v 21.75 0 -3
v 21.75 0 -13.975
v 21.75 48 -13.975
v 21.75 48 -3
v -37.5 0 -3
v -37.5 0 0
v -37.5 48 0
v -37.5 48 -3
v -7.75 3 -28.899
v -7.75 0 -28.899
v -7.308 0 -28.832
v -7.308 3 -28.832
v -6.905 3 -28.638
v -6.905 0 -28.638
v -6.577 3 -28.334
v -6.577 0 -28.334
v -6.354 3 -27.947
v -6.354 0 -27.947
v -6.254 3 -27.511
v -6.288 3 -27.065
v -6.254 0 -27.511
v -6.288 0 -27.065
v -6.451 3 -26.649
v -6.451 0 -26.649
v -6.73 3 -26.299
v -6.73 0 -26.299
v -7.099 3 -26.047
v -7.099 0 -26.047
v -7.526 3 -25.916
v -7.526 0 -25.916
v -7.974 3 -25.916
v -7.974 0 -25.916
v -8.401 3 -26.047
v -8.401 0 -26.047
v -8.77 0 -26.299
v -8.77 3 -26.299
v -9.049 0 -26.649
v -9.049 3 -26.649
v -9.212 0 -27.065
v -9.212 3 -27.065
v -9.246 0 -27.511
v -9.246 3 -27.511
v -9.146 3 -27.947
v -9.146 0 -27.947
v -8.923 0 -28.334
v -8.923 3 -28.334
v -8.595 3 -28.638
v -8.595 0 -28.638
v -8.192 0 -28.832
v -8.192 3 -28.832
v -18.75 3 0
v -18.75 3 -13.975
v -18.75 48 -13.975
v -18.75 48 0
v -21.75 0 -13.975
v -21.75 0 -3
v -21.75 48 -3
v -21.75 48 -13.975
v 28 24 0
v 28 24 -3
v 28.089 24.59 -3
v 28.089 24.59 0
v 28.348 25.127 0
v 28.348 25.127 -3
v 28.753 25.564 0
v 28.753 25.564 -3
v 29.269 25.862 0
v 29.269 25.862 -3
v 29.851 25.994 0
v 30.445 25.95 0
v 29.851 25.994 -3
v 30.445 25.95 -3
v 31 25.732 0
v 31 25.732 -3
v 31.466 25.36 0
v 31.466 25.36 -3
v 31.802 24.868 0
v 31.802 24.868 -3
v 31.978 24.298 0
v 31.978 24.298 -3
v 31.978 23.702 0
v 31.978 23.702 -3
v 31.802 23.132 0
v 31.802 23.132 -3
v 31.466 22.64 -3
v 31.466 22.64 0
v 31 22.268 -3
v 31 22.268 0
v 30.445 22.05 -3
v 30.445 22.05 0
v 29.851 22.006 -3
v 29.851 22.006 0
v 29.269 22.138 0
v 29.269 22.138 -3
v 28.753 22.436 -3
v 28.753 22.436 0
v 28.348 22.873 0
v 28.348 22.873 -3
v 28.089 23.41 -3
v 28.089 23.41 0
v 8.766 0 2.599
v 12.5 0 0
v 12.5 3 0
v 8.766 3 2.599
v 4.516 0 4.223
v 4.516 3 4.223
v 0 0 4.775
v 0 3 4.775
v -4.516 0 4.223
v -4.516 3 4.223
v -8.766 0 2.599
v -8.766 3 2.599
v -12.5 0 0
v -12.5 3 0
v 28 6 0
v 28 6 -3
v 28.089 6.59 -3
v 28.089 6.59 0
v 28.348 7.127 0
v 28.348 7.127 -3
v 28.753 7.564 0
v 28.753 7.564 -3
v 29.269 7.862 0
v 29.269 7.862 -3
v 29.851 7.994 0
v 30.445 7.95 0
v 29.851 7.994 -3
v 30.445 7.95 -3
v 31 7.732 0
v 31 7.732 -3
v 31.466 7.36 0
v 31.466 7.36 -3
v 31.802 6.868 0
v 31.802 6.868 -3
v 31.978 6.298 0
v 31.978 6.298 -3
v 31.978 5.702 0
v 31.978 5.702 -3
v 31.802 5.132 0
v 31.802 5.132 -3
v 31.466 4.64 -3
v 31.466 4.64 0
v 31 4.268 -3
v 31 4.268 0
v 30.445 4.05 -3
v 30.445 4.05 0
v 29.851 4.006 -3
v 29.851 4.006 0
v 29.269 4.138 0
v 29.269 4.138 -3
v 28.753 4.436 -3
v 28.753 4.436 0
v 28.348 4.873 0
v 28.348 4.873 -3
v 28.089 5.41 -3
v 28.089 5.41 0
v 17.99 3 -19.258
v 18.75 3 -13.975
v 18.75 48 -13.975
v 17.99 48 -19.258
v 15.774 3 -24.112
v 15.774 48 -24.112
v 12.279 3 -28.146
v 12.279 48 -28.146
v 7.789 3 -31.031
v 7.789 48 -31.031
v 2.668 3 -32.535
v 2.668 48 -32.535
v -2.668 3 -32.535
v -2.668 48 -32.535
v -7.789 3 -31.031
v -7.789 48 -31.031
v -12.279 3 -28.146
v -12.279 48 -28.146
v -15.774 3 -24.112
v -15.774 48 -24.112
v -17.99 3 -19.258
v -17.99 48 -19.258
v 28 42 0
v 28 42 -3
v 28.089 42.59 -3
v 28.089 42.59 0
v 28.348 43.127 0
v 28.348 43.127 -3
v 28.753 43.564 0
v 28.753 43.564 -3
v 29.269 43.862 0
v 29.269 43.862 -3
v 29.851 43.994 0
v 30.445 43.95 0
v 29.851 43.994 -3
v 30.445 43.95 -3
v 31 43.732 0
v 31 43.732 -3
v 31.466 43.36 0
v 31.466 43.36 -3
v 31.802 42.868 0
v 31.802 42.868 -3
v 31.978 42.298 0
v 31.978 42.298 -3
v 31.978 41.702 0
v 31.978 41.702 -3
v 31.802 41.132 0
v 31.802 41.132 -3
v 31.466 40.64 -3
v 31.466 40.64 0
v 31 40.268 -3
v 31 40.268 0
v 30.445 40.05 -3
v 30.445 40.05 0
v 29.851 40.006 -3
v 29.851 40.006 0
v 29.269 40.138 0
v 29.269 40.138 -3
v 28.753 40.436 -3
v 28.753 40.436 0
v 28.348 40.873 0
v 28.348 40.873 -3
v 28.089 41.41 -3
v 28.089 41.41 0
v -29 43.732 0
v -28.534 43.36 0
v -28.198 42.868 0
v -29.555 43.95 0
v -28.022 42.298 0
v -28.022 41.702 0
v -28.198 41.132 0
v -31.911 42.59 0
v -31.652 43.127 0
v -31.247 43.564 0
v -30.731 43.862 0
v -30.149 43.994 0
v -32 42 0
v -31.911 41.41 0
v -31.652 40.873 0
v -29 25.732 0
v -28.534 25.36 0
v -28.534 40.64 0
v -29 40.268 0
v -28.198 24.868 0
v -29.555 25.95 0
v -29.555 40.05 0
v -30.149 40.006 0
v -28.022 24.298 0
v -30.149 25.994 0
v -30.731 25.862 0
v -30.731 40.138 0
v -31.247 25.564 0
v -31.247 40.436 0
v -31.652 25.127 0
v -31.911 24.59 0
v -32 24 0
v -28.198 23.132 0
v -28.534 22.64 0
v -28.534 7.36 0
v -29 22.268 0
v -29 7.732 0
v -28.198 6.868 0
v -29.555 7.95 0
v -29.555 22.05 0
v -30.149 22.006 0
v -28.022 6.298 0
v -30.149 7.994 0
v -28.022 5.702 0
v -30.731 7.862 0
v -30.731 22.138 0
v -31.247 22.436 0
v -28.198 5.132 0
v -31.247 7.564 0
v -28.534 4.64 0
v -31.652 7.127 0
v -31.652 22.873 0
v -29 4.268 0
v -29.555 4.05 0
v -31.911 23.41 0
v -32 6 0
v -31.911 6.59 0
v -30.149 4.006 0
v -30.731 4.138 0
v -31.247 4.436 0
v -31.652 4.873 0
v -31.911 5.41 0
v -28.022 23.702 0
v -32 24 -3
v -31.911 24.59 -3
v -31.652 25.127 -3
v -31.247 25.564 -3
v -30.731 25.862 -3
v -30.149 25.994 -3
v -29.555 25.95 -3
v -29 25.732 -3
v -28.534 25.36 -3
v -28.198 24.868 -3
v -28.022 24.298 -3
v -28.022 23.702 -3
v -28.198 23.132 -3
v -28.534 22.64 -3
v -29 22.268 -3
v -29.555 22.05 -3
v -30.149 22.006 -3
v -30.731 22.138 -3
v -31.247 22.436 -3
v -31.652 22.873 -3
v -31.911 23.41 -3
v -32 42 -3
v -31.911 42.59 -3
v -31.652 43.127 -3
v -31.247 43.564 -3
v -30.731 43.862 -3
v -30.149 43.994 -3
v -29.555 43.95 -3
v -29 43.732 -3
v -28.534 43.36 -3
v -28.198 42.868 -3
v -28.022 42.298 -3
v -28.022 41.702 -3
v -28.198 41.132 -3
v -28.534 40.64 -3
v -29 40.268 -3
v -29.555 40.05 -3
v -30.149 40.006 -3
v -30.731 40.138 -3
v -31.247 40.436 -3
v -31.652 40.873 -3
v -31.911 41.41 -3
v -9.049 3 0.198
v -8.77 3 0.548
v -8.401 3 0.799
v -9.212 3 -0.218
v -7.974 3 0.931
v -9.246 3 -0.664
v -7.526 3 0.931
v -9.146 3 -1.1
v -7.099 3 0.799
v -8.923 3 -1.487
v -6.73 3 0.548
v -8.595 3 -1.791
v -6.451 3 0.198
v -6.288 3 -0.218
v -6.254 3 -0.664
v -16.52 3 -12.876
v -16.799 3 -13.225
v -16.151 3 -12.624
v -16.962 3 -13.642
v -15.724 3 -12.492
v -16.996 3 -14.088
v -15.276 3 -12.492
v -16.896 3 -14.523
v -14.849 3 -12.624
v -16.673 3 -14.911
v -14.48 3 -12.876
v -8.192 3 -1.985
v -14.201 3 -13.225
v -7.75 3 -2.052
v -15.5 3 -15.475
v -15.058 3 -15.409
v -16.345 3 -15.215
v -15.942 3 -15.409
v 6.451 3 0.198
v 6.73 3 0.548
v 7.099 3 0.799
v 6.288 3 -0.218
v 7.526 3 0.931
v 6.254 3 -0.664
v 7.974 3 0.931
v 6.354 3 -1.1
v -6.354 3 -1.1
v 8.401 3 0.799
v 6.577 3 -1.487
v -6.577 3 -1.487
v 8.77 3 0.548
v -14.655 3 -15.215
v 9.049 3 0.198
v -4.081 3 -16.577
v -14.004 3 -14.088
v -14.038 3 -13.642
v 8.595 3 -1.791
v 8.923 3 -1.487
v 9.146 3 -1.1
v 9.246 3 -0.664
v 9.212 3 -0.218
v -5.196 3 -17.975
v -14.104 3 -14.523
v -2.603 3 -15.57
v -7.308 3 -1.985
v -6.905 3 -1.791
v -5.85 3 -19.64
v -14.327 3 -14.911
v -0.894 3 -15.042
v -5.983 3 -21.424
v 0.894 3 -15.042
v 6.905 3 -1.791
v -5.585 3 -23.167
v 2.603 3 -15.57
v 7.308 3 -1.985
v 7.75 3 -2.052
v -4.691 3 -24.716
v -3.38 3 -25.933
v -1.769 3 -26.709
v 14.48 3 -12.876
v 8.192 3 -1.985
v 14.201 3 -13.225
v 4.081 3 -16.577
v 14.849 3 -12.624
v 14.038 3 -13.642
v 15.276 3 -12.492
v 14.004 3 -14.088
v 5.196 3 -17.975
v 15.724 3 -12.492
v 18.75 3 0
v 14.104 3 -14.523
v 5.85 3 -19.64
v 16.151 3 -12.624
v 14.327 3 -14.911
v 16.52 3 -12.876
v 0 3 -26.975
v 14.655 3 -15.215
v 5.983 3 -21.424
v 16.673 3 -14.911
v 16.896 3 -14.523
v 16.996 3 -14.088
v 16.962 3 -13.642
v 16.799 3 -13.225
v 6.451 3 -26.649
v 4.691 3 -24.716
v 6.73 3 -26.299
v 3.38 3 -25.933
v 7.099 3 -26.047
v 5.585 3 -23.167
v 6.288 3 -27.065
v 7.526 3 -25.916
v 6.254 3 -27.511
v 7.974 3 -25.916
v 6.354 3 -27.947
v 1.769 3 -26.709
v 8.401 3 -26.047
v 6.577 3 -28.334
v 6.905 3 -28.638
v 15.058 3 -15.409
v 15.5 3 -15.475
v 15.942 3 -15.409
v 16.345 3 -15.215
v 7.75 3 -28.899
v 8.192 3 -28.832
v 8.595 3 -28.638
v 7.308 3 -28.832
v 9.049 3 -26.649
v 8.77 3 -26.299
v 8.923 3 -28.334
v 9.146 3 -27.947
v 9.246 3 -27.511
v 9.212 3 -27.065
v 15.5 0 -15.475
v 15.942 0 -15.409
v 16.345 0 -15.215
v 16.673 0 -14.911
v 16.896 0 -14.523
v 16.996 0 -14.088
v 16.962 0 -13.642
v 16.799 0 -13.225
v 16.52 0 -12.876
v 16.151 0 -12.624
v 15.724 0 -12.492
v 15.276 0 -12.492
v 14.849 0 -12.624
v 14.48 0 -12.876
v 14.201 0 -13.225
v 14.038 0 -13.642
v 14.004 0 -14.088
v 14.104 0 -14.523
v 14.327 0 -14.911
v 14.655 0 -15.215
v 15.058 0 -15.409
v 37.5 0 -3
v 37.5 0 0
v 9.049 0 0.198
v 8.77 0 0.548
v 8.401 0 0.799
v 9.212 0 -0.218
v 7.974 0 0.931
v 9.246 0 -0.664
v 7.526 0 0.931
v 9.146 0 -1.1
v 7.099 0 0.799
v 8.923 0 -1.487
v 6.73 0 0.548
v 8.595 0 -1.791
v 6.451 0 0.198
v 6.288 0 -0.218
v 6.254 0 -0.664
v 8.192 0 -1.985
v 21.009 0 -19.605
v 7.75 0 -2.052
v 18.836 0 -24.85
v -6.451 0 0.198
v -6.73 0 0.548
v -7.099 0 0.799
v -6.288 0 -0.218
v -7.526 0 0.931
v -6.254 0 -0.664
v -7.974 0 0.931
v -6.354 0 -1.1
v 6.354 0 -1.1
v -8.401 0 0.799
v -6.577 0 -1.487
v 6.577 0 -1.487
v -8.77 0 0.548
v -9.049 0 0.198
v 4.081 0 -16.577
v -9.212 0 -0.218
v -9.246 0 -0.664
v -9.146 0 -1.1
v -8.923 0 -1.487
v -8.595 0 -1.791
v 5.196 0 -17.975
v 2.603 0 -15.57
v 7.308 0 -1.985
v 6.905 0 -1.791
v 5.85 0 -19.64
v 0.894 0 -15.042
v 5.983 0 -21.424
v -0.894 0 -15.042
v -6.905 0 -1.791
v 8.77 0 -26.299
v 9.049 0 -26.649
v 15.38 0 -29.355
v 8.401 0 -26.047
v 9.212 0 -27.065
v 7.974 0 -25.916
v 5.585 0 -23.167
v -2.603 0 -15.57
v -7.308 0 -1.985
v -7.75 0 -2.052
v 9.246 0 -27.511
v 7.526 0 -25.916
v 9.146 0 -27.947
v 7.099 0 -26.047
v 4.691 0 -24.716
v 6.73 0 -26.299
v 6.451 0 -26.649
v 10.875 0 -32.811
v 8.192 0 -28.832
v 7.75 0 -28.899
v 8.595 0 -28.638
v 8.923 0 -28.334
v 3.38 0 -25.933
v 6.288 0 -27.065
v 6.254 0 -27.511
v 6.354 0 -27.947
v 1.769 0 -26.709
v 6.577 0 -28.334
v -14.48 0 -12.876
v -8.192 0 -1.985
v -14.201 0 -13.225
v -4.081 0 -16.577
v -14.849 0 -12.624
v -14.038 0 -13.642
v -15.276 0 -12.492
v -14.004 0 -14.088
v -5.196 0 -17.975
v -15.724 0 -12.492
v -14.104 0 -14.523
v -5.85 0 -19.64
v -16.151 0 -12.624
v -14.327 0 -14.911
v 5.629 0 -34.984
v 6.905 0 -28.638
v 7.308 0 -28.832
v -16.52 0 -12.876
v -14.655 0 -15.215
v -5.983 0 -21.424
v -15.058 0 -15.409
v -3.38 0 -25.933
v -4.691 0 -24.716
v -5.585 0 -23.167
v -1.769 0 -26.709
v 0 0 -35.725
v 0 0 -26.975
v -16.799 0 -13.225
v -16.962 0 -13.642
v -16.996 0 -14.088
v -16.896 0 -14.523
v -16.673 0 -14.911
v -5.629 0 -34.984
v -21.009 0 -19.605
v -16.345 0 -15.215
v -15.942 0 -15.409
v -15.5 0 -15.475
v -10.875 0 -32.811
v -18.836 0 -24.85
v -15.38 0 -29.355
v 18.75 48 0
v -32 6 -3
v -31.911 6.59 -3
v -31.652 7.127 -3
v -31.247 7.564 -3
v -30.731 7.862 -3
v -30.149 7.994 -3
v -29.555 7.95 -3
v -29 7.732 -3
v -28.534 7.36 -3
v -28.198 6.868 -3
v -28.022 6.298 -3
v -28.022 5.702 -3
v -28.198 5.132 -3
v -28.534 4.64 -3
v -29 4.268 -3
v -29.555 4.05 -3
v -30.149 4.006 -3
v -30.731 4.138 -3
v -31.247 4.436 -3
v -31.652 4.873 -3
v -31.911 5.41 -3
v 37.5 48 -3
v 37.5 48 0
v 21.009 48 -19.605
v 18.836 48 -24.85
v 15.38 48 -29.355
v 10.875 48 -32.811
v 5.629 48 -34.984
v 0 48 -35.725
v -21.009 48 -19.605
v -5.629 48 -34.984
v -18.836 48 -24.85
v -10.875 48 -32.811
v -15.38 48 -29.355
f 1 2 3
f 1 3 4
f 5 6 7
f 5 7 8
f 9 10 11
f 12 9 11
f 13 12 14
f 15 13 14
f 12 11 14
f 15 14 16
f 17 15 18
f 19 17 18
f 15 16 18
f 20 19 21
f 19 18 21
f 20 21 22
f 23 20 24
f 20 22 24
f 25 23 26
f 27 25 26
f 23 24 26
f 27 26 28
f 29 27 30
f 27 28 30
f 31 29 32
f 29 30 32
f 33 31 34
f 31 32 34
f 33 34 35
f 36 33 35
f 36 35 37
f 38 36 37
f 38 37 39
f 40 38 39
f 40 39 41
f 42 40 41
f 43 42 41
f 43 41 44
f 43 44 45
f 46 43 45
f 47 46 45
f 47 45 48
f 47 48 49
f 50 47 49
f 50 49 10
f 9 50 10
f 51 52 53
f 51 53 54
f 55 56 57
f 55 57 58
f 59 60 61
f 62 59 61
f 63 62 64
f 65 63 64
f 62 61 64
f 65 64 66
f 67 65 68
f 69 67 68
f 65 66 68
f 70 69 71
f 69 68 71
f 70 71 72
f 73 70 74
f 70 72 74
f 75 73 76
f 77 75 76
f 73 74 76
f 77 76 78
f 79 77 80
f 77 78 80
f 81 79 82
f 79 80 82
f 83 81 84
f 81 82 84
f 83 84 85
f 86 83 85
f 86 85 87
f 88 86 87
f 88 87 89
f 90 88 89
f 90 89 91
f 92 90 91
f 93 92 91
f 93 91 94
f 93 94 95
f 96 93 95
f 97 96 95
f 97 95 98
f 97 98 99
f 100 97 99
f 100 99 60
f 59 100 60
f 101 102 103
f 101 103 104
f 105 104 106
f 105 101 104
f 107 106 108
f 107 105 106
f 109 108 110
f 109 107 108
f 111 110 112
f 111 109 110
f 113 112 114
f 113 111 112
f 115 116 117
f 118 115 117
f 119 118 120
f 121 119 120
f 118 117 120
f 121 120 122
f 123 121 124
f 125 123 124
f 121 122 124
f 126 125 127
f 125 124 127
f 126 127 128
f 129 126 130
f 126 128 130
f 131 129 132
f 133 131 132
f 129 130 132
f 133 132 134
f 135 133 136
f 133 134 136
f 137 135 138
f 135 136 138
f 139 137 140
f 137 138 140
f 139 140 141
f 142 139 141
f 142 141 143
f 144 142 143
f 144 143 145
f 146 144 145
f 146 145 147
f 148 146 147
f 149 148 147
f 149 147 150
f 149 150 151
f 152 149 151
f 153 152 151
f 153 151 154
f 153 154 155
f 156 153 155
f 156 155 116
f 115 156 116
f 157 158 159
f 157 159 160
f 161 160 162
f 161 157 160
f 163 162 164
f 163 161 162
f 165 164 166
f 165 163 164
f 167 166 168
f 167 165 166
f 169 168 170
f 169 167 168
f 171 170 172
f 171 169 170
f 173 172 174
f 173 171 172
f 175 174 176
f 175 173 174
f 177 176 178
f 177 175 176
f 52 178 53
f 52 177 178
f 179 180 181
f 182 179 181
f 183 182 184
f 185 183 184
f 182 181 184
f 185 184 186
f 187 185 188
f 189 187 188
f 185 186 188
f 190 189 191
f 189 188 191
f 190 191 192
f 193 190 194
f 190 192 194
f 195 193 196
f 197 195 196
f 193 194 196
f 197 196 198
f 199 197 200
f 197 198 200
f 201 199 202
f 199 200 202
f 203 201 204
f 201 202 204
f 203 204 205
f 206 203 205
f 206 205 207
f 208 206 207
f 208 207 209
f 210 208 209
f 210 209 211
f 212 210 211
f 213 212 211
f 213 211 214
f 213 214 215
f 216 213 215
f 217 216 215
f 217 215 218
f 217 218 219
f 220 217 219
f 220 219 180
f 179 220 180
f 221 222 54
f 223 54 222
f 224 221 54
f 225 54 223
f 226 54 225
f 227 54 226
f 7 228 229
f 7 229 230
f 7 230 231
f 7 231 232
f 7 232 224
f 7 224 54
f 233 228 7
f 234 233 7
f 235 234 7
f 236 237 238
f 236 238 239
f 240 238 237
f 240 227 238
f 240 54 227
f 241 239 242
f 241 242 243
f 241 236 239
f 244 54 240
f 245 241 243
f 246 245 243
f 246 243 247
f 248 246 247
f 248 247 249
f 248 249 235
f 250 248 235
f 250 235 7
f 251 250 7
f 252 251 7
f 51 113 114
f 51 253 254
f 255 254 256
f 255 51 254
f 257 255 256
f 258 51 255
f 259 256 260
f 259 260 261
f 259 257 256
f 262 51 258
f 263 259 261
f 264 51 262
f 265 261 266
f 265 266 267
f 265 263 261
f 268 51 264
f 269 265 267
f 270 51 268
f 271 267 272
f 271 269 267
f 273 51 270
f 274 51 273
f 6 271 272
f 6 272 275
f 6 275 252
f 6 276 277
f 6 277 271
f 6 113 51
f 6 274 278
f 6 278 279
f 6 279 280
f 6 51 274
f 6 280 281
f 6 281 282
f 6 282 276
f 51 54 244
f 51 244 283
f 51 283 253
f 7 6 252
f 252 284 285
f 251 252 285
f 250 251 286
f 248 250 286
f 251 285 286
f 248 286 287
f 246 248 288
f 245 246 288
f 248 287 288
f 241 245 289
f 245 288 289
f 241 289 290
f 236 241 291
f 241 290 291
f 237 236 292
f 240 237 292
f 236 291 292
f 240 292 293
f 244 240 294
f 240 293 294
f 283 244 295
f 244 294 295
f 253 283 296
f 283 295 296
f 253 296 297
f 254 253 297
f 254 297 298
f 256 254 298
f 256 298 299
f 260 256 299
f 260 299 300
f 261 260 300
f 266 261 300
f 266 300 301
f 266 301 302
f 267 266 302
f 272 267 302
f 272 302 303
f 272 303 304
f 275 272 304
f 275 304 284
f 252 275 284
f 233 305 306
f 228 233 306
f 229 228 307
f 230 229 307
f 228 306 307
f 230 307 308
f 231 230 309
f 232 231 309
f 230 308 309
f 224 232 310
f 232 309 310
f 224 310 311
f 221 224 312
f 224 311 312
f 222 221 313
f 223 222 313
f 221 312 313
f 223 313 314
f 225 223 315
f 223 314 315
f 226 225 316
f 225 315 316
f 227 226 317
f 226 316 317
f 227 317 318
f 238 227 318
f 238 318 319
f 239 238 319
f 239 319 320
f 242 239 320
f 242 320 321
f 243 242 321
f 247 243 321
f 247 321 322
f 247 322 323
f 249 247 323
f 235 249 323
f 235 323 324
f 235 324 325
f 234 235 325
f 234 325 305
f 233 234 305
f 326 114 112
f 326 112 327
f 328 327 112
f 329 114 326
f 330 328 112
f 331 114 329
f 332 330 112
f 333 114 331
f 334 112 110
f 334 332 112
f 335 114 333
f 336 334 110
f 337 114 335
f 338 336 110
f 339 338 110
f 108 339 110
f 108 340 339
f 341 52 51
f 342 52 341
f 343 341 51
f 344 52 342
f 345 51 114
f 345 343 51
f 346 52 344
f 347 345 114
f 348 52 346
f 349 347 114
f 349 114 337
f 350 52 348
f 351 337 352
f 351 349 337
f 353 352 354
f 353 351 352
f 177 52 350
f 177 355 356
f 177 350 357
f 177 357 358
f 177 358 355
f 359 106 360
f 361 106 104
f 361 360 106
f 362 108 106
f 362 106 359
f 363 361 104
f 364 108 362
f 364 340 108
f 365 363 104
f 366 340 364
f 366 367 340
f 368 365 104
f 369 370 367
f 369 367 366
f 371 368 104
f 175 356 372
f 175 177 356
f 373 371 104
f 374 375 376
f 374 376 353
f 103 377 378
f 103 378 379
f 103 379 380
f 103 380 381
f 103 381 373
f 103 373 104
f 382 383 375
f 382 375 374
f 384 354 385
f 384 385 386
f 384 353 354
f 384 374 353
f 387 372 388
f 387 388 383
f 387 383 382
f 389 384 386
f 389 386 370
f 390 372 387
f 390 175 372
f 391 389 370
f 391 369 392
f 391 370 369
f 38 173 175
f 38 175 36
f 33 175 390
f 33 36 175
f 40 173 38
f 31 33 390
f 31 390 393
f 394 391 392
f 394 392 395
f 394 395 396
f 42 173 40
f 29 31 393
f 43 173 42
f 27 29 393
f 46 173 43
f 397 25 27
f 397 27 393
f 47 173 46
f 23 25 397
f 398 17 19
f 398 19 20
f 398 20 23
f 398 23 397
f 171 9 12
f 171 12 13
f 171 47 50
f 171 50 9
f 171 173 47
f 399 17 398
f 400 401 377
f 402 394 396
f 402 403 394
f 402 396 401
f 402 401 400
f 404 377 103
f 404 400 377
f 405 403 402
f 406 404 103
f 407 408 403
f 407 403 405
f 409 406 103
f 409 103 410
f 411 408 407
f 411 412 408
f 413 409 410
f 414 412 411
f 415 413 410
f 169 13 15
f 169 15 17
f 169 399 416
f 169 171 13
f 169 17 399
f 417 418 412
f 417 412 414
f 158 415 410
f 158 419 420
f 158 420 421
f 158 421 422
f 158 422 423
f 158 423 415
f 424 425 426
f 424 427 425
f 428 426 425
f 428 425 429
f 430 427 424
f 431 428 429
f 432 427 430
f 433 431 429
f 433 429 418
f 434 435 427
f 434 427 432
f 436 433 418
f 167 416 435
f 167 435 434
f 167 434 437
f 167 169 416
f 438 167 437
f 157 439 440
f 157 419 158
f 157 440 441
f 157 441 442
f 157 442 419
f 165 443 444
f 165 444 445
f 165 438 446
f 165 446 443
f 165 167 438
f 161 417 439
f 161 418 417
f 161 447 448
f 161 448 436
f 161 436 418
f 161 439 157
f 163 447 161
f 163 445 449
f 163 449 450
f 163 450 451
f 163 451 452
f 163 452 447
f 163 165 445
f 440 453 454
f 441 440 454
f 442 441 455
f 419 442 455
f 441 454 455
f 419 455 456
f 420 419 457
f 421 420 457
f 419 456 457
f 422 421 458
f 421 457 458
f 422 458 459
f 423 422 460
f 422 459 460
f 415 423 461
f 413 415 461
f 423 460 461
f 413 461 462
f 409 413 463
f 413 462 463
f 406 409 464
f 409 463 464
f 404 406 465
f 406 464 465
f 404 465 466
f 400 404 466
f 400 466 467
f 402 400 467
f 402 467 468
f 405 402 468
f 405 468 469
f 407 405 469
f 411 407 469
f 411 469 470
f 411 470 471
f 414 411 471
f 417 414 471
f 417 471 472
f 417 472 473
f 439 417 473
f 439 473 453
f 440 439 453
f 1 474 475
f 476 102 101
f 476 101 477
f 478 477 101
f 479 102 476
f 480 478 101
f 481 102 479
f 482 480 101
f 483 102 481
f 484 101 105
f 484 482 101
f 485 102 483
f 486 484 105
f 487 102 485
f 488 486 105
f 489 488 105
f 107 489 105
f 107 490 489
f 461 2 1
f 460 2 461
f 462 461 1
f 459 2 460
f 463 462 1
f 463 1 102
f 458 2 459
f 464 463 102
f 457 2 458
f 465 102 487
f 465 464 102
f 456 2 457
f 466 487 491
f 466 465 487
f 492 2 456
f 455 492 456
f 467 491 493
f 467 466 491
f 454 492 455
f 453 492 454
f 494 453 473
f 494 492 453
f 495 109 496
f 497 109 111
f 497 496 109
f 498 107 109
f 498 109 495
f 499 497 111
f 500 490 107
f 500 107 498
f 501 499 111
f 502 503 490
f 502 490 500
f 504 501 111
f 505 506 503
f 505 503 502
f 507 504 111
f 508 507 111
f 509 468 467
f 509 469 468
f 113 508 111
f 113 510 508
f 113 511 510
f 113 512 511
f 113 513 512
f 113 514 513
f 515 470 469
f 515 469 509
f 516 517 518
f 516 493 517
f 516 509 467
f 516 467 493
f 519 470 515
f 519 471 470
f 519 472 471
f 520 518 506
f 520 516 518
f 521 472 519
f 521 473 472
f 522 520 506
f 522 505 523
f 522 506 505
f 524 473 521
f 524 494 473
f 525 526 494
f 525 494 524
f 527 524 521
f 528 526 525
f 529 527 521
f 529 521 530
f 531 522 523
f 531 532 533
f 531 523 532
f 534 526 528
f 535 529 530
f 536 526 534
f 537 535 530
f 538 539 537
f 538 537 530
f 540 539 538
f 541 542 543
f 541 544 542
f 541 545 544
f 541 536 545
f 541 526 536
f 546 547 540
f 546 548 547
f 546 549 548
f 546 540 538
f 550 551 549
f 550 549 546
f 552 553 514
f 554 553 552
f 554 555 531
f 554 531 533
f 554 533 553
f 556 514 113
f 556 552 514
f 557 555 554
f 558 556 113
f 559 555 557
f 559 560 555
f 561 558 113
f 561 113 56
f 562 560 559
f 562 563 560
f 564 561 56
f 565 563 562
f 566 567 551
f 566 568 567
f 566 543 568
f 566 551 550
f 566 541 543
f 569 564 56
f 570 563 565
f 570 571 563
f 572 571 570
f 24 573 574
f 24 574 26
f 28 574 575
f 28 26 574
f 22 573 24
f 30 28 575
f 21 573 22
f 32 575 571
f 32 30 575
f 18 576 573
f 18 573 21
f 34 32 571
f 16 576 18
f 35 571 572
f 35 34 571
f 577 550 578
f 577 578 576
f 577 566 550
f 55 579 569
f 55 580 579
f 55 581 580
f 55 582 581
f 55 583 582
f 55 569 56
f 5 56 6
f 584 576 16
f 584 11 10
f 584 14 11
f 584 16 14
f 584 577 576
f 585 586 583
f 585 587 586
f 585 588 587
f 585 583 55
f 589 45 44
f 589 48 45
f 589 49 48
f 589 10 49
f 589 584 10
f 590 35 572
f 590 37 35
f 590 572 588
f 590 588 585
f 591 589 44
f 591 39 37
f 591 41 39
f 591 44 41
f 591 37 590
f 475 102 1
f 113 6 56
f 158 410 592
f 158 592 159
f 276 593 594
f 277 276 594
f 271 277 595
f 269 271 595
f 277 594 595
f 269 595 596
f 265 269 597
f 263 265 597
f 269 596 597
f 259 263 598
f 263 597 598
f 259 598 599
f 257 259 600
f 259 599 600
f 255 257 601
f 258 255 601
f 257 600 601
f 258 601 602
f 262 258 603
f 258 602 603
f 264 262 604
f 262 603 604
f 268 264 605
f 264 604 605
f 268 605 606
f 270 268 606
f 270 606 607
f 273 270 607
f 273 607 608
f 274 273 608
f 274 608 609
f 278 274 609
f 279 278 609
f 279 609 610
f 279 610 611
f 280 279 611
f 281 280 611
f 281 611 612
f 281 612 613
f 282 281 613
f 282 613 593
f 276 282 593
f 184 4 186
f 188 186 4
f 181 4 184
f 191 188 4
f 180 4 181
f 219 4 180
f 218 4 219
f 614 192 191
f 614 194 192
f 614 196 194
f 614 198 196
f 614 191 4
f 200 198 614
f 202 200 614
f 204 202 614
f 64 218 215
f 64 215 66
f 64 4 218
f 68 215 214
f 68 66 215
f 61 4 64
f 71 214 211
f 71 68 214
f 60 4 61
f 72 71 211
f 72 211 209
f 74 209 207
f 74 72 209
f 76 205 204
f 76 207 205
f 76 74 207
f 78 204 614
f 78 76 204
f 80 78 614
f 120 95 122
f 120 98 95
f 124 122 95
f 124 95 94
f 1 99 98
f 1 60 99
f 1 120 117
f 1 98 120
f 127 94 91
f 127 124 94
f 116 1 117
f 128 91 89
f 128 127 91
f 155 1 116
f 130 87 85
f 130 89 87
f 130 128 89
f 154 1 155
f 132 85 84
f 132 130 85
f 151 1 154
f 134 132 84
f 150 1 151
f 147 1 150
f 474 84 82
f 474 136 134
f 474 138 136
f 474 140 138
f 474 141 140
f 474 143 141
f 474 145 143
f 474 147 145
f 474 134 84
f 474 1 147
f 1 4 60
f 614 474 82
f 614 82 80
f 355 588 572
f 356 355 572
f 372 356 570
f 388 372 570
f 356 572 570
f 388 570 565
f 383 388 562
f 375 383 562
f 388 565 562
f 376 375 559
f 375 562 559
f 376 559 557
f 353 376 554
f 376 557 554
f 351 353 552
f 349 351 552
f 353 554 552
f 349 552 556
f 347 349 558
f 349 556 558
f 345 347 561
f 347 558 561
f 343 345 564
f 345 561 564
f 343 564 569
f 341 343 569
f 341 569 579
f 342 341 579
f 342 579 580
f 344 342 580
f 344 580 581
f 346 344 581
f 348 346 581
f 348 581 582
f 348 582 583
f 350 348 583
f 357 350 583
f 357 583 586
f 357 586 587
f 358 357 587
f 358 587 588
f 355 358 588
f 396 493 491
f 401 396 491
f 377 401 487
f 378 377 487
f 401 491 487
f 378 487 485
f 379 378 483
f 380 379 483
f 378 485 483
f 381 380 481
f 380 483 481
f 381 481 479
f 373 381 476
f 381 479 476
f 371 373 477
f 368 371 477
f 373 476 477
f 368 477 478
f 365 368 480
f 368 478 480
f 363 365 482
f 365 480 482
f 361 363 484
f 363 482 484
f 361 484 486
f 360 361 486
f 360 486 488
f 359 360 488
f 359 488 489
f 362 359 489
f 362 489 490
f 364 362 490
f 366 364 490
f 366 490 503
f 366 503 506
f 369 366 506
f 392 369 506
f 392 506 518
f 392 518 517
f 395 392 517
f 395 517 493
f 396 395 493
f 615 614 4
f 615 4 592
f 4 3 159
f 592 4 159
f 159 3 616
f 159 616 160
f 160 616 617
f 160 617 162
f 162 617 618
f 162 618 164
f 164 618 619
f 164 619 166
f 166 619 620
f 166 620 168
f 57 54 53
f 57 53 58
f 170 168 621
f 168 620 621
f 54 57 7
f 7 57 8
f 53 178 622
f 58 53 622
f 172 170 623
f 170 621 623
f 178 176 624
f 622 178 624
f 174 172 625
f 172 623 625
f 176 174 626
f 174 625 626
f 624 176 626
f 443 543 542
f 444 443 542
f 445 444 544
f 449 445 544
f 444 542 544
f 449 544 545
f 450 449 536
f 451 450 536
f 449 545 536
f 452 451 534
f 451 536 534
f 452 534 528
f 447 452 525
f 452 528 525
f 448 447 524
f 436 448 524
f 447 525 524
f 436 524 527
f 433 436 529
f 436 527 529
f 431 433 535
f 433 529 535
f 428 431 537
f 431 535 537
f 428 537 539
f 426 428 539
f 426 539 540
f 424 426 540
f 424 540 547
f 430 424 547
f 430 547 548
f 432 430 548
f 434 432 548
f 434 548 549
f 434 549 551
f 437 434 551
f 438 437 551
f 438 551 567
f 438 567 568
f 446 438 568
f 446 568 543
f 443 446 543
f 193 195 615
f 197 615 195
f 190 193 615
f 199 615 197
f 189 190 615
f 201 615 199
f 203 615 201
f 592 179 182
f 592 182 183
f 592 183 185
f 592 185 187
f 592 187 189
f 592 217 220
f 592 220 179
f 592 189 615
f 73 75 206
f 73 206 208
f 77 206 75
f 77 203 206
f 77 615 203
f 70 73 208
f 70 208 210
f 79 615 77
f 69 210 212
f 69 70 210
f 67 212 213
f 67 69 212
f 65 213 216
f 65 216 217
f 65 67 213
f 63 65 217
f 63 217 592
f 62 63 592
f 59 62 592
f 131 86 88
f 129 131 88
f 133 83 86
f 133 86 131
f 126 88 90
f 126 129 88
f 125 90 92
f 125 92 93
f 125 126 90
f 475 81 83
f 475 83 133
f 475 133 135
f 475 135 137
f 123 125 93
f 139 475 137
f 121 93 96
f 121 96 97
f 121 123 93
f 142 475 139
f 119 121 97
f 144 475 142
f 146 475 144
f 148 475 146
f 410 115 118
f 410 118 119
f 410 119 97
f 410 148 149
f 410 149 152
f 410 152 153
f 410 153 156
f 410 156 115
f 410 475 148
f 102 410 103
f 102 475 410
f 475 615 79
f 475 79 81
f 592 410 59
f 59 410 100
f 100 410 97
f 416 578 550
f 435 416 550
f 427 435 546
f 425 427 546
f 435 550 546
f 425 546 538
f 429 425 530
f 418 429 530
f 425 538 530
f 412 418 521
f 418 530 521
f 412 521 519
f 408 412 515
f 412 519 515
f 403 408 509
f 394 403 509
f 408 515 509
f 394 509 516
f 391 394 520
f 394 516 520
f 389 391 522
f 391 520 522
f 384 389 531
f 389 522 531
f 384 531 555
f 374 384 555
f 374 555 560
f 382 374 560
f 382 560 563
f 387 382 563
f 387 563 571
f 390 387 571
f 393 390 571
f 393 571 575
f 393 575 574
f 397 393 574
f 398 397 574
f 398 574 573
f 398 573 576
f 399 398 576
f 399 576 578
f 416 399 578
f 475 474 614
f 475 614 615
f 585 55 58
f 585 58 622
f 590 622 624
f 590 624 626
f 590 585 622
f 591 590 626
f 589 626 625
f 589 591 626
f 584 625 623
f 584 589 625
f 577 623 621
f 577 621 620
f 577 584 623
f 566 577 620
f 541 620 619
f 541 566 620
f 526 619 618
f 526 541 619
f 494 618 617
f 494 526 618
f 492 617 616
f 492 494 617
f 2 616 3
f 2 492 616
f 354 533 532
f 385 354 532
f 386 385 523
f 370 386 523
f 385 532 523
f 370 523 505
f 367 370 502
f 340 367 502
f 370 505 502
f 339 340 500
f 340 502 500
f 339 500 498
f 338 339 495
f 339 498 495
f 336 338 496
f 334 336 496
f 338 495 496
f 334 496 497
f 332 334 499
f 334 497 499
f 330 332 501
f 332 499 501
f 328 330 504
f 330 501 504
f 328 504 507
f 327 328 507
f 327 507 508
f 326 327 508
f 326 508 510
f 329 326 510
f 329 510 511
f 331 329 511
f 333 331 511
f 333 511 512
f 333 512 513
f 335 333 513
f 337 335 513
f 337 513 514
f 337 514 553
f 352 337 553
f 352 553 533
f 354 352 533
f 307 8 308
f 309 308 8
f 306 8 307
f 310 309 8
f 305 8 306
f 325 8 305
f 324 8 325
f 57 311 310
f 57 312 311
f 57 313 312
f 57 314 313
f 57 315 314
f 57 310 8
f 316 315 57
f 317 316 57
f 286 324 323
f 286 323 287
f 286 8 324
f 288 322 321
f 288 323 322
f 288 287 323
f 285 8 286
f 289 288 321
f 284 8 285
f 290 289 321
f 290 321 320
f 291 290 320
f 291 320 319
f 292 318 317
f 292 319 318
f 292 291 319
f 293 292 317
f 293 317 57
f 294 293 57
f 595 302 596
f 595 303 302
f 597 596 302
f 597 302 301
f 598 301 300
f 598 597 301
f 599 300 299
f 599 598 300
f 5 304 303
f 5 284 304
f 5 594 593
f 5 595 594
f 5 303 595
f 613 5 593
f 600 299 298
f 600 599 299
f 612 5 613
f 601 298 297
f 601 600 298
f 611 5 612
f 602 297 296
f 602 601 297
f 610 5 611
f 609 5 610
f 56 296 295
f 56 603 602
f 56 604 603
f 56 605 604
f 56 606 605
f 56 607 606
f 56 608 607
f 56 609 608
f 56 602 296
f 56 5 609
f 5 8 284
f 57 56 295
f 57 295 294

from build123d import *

# Parameters (mm, degrees)
BOSS_EXTRUDE1_DEPTH     = 48
CUT_EXTRUDE1_DEPTH      = 71.615550563
CUT_EXTRUDE1_DEPTH_BACK = 45
SKETCH3_R               = 6
SKETCH3_R_2             = 1.5
CUT_EXTRUDE2_DEPTH      = 71.615550563
SKETCH4_R               = 2
CUT_EXTRUDE3_DEPTH      = 70.146246697


with BuildPart() as part:
    # Sketch1 → Boss-Extrude1 (new body)
    with BuildSketch(Plane(origin=(0, 0, 0), x_dir=(1, 0, 0), z_dir=(0, 1, 0))):
        with BuildLine():
            Line((37.5, 0), (12.5, 0))
            ThreePointArc((12.5, 0), (0, -4.774575141), (-12.5, 0))
            Line((-12.5, 0), (-37.5, 0))
            Line((-37.5, 0), (-37.5, 3))
            Line((-37.5, 3), (-21.75, 3))
            Line((-21.75, 3), (-21.75, 13.975424859))
            ThreePointArc((-21.75, 13.975424859), (0, 35.725424859), (21.75, 13.975424859))
            Line((21.75, 13.975424859), (21.75, 3))
            Line((21.75, 3), (37.5, 3))
            Line((37.5, 3), (37.5, 0))
        make_face()
    extrude(amount=BOSS_EXTRUDE1_DEPTH)

    # Sketch2 → Cut-Extrude1 (cut, two sides: drawn at the far end of the back side and taken through both)
    with BuildSketch(Plane(origin=(0, 48, 0), x_dir=(1, 0, 0), z_dir=(0, 1, 0)).offset(-CUT_EXTRUDE1_DEPTH_BACK)):
        with BuildLine():
            Line((18.75, -143.272179863), (18.75, 0))
            Line((18.75, 0), (18.75, 13.975424859))
            ThreePointArc((18.75, 13.975424859), (0, 32.725424859), (-18.75, 13.975424859))
            Line((-18.75, 13.975424859), (-18.75, 0))
            Line((-18.75, 0), (-18.75, -143.272179863))
            Line((-18.75, -143.272179863), (-18.75, -429.81653959))
            Line((-18.75, -429.81653959), (18.75, -429.81653959))
            Line((18.75, -429.81653959), (18.75, -143.272179863))
        make_face()
    extrude(amount=CUT_EXTRUDE1_DEPTH + CUT_EXTRUDE1_DEPTH_BACK, mode=Mode.SUBTRACT)

    # Sketch3 → Cut-Extrude2 (cut, through all)
    with BuildSketch(Plane.XZ):
        with Locations(Location((0, -20.975424859, 0), (0, 0, 270))):
            Circle(SKETCH3_R)
        with Locations(Location((15.5, -13.975424859, 0), (0, 0, 270))):
            Circle(SKETCH3_R_2)
        with Locations(Location((7.75, -27.398818618, 0), (0, 0, 270))):
            Circle(SKETCH3_R_2)
        with Locations(Location((-7.75, -27.398818618, 0), (0, 0, 270))):
            Circle(SKETCH3_R_2)
        with Locations(Location((-15.5, -13.975424859, 0), (0, 0, 270))):
            Circle(SKETCH3_R_2)
        with Locations(Location((-7.75, -0.552031101, 0), (0, 0, 270))):
            Circle(SKETCH3_R_2)
        with Locations(Location((7.75, -0.552031101, 0), (0, 0, 270))):
            Circle(SKETCH3_R_2)
    extrude(amount=-CUT_EXTRUDE2_DEPTH, mode=Mode.SUBTRACT)

    # Sketch4 → Cut-Extrude3 (cut, through all)
    with BuildSketch(Plane(origin=(0, 0, -3), x_dir=(-1, 0, 0), z_dir=(0, 0, -1))):
        with Locations((-30, 6)):
            Circle(SKETCH4_R)
        with Locations((-30, 24)):
            Circle(SKETCH4_R)
        with Locations((-30, 42)):
            Circle(SKETCH4_R)
        with Locations((30, 6)):
            Circle(SKETCH4_R)
        with Locations((30, 24)):
            Circle(SKETCH4_R)
        with Locations((30, 42)):
            Circle(SKETCH4_R)
    extrude(amount=-CUT_EXTRUDE3_DEPTH, mode=Mode.SUBTRACT)


solid = part.part
